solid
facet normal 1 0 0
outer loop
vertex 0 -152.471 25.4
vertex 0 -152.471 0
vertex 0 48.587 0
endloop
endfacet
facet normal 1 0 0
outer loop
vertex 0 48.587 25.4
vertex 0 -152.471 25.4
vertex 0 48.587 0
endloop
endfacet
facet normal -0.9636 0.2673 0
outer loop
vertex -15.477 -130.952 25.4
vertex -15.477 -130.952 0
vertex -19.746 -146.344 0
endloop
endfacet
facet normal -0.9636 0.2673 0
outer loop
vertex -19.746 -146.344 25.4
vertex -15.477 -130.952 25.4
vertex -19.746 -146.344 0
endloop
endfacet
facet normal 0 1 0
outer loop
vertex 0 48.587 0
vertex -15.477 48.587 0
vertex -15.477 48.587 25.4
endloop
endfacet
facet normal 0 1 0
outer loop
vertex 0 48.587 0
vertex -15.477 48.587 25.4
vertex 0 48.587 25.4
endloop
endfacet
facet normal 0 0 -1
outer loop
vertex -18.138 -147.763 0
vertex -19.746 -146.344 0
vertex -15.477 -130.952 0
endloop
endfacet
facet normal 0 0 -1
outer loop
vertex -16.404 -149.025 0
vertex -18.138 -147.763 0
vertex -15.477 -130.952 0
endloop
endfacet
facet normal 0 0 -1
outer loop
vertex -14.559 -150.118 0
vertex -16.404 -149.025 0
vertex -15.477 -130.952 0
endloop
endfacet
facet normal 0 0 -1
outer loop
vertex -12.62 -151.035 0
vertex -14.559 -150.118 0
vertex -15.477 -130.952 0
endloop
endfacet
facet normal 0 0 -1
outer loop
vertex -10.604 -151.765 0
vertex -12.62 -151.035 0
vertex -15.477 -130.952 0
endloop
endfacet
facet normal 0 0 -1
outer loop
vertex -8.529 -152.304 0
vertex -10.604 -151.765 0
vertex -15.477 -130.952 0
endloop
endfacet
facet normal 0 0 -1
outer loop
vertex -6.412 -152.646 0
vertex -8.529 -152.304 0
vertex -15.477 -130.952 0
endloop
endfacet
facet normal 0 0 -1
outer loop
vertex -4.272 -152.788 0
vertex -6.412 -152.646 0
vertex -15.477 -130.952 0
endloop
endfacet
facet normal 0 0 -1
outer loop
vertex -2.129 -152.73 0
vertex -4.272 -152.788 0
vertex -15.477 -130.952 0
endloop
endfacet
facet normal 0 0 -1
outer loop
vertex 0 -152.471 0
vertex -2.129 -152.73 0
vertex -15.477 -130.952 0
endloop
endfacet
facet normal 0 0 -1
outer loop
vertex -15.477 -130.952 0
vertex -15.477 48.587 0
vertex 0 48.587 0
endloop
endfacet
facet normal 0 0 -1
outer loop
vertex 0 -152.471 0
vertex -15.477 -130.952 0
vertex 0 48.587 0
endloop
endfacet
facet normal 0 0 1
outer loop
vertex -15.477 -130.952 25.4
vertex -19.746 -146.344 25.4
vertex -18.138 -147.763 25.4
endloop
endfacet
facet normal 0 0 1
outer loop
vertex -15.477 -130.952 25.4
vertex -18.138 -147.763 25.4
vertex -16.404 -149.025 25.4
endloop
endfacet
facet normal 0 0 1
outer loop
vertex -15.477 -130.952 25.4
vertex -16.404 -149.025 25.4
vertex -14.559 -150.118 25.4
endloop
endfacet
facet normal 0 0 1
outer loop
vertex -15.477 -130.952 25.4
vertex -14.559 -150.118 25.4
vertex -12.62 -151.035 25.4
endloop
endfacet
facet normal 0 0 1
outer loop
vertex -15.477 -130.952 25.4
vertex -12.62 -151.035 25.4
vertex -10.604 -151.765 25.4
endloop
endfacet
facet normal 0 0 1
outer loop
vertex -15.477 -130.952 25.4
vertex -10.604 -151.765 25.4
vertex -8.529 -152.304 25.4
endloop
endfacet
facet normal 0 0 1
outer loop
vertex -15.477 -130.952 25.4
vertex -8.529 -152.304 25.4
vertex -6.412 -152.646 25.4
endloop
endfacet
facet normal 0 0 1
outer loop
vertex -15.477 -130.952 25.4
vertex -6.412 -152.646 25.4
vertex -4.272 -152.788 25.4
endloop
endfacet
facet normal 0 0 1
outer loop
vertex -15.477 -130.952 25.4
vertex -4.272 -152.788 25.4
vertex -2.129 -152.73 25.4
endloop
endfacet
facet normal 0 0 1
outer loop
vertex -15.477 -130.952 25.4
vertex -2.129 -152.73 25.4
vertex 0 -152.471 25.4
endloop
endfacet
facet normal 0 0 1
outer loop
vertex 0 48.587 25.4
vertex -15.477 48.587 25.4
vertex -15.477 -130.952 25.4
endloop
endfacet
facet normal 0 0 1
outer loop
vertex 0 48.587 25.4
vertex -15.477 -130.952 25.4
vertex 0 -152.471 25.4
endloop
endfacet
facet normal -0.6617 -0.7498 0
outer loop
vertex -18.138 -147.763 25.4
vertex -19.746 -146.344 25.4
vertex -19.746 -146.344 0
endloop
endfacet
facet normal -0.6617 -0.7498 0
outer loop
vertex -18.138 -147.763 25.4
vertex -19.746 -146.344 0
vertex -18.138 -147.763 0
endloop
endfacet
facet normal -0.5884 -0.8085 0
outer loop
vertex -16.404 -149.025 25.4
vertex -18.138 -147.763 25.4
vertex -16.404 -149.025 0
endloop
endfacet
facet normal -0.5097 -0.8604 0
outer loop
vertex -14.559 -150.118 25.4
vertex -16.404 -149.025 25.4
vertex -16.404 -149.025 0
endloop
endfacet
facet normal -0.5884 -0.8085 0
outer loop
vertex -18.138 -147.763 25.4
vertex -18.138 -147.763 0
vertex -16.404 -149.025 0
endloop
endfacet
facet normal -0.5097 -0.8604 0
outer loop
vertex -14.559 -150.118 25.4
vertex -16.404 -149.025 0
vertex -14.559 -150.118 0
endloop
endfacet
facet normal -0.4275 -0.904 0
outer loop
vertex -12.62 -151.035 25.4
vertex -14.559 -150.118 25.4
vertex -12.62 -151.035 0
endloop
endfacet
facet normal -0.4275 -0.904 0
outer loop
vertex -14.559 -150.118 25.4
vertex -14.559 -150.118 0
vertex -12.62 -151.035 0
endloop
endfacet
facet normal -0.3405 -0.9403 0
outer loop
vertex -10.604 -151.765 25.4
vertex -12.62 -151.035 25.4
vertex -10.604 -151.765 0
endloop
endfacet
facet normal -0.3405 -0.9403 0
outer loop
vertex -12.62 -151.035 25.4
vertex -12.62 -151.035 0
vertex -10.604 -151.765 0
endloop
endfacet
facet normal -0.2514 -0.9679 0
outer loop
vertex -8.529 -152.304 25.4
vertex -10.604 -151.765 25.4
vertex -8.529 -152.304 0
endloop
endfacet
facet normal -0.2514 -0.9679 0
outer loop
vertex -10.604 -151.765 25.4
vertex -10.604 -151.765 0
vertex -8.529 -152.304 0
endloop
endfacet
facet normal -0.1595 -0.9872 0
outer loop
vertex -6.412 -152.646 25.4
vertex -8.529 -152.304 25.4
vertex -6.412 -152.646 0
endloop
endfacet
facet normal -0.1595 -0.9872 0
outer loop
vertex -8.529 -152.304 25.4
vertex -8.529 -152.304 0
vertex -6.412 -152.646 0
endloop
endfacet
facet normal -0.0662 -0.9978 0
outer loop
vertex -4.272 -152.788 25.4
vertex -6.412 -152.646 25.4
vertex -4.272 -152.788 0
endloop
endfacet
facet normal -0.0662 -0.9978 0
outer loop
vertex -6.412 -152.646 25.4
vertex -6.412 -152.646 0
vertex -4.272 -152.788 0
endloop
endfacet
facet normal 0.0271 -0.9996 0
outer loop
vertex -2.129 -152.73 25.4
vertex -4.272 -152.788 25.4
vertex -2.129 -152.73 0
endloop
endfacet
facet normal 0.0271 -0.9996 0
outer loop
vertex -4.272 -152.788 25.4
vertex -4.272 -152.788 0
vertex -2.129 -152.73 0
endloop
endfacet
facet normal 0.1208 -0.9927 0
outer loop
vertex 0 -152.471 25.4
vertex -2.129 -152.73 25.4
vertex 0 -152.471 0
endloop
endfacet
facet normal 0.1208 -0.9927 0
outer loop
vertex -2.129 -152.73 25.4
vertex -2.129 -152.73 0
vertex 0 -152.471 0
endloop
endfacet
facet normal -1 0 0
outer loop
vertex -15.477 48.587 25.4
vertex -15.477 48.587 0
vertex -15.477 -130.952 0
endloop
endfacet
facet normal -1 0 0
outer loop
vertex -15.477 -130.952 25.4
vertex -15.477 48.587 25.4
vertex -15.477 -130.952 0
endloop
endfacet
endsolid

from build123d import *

# Parameters (mm, degrees)
F0_W     = 15.477344
F0_H     = 72.370944
F1_DEPTH = 25.4


with BuildPart() as f1:
    # F0 (on Top) → F1 (new body)
    with BuildSketch(Plane.XY):
        with BuildLine():
            Line((-15.477344, -142.19746), (-15.477344, -130.952388))
            Line((-15.477344, -130.952388), (-19.745878, -146.344457))
            ThreePointArc((-19.745878, -146.344457), (-10.60441, -151.765249), (0, -152.470872))
            Line((0, -152.470872), (0, -142.19746))
            Line((0, -142.19746), (-15.477344, -142.19746))
        make_face()
        Polygon((0, -23.784393), (-15.477344, -23.784393), (-15.477344, -130.952388), (-15.477344, -142.19746), (0, -142.19746), align=None)
        with Locations((-7.738672, 12.401079)):
            Rectangle(F0_W, F0_H)
    extrude(amount=F1_DEPTH)


solid = f1.part
